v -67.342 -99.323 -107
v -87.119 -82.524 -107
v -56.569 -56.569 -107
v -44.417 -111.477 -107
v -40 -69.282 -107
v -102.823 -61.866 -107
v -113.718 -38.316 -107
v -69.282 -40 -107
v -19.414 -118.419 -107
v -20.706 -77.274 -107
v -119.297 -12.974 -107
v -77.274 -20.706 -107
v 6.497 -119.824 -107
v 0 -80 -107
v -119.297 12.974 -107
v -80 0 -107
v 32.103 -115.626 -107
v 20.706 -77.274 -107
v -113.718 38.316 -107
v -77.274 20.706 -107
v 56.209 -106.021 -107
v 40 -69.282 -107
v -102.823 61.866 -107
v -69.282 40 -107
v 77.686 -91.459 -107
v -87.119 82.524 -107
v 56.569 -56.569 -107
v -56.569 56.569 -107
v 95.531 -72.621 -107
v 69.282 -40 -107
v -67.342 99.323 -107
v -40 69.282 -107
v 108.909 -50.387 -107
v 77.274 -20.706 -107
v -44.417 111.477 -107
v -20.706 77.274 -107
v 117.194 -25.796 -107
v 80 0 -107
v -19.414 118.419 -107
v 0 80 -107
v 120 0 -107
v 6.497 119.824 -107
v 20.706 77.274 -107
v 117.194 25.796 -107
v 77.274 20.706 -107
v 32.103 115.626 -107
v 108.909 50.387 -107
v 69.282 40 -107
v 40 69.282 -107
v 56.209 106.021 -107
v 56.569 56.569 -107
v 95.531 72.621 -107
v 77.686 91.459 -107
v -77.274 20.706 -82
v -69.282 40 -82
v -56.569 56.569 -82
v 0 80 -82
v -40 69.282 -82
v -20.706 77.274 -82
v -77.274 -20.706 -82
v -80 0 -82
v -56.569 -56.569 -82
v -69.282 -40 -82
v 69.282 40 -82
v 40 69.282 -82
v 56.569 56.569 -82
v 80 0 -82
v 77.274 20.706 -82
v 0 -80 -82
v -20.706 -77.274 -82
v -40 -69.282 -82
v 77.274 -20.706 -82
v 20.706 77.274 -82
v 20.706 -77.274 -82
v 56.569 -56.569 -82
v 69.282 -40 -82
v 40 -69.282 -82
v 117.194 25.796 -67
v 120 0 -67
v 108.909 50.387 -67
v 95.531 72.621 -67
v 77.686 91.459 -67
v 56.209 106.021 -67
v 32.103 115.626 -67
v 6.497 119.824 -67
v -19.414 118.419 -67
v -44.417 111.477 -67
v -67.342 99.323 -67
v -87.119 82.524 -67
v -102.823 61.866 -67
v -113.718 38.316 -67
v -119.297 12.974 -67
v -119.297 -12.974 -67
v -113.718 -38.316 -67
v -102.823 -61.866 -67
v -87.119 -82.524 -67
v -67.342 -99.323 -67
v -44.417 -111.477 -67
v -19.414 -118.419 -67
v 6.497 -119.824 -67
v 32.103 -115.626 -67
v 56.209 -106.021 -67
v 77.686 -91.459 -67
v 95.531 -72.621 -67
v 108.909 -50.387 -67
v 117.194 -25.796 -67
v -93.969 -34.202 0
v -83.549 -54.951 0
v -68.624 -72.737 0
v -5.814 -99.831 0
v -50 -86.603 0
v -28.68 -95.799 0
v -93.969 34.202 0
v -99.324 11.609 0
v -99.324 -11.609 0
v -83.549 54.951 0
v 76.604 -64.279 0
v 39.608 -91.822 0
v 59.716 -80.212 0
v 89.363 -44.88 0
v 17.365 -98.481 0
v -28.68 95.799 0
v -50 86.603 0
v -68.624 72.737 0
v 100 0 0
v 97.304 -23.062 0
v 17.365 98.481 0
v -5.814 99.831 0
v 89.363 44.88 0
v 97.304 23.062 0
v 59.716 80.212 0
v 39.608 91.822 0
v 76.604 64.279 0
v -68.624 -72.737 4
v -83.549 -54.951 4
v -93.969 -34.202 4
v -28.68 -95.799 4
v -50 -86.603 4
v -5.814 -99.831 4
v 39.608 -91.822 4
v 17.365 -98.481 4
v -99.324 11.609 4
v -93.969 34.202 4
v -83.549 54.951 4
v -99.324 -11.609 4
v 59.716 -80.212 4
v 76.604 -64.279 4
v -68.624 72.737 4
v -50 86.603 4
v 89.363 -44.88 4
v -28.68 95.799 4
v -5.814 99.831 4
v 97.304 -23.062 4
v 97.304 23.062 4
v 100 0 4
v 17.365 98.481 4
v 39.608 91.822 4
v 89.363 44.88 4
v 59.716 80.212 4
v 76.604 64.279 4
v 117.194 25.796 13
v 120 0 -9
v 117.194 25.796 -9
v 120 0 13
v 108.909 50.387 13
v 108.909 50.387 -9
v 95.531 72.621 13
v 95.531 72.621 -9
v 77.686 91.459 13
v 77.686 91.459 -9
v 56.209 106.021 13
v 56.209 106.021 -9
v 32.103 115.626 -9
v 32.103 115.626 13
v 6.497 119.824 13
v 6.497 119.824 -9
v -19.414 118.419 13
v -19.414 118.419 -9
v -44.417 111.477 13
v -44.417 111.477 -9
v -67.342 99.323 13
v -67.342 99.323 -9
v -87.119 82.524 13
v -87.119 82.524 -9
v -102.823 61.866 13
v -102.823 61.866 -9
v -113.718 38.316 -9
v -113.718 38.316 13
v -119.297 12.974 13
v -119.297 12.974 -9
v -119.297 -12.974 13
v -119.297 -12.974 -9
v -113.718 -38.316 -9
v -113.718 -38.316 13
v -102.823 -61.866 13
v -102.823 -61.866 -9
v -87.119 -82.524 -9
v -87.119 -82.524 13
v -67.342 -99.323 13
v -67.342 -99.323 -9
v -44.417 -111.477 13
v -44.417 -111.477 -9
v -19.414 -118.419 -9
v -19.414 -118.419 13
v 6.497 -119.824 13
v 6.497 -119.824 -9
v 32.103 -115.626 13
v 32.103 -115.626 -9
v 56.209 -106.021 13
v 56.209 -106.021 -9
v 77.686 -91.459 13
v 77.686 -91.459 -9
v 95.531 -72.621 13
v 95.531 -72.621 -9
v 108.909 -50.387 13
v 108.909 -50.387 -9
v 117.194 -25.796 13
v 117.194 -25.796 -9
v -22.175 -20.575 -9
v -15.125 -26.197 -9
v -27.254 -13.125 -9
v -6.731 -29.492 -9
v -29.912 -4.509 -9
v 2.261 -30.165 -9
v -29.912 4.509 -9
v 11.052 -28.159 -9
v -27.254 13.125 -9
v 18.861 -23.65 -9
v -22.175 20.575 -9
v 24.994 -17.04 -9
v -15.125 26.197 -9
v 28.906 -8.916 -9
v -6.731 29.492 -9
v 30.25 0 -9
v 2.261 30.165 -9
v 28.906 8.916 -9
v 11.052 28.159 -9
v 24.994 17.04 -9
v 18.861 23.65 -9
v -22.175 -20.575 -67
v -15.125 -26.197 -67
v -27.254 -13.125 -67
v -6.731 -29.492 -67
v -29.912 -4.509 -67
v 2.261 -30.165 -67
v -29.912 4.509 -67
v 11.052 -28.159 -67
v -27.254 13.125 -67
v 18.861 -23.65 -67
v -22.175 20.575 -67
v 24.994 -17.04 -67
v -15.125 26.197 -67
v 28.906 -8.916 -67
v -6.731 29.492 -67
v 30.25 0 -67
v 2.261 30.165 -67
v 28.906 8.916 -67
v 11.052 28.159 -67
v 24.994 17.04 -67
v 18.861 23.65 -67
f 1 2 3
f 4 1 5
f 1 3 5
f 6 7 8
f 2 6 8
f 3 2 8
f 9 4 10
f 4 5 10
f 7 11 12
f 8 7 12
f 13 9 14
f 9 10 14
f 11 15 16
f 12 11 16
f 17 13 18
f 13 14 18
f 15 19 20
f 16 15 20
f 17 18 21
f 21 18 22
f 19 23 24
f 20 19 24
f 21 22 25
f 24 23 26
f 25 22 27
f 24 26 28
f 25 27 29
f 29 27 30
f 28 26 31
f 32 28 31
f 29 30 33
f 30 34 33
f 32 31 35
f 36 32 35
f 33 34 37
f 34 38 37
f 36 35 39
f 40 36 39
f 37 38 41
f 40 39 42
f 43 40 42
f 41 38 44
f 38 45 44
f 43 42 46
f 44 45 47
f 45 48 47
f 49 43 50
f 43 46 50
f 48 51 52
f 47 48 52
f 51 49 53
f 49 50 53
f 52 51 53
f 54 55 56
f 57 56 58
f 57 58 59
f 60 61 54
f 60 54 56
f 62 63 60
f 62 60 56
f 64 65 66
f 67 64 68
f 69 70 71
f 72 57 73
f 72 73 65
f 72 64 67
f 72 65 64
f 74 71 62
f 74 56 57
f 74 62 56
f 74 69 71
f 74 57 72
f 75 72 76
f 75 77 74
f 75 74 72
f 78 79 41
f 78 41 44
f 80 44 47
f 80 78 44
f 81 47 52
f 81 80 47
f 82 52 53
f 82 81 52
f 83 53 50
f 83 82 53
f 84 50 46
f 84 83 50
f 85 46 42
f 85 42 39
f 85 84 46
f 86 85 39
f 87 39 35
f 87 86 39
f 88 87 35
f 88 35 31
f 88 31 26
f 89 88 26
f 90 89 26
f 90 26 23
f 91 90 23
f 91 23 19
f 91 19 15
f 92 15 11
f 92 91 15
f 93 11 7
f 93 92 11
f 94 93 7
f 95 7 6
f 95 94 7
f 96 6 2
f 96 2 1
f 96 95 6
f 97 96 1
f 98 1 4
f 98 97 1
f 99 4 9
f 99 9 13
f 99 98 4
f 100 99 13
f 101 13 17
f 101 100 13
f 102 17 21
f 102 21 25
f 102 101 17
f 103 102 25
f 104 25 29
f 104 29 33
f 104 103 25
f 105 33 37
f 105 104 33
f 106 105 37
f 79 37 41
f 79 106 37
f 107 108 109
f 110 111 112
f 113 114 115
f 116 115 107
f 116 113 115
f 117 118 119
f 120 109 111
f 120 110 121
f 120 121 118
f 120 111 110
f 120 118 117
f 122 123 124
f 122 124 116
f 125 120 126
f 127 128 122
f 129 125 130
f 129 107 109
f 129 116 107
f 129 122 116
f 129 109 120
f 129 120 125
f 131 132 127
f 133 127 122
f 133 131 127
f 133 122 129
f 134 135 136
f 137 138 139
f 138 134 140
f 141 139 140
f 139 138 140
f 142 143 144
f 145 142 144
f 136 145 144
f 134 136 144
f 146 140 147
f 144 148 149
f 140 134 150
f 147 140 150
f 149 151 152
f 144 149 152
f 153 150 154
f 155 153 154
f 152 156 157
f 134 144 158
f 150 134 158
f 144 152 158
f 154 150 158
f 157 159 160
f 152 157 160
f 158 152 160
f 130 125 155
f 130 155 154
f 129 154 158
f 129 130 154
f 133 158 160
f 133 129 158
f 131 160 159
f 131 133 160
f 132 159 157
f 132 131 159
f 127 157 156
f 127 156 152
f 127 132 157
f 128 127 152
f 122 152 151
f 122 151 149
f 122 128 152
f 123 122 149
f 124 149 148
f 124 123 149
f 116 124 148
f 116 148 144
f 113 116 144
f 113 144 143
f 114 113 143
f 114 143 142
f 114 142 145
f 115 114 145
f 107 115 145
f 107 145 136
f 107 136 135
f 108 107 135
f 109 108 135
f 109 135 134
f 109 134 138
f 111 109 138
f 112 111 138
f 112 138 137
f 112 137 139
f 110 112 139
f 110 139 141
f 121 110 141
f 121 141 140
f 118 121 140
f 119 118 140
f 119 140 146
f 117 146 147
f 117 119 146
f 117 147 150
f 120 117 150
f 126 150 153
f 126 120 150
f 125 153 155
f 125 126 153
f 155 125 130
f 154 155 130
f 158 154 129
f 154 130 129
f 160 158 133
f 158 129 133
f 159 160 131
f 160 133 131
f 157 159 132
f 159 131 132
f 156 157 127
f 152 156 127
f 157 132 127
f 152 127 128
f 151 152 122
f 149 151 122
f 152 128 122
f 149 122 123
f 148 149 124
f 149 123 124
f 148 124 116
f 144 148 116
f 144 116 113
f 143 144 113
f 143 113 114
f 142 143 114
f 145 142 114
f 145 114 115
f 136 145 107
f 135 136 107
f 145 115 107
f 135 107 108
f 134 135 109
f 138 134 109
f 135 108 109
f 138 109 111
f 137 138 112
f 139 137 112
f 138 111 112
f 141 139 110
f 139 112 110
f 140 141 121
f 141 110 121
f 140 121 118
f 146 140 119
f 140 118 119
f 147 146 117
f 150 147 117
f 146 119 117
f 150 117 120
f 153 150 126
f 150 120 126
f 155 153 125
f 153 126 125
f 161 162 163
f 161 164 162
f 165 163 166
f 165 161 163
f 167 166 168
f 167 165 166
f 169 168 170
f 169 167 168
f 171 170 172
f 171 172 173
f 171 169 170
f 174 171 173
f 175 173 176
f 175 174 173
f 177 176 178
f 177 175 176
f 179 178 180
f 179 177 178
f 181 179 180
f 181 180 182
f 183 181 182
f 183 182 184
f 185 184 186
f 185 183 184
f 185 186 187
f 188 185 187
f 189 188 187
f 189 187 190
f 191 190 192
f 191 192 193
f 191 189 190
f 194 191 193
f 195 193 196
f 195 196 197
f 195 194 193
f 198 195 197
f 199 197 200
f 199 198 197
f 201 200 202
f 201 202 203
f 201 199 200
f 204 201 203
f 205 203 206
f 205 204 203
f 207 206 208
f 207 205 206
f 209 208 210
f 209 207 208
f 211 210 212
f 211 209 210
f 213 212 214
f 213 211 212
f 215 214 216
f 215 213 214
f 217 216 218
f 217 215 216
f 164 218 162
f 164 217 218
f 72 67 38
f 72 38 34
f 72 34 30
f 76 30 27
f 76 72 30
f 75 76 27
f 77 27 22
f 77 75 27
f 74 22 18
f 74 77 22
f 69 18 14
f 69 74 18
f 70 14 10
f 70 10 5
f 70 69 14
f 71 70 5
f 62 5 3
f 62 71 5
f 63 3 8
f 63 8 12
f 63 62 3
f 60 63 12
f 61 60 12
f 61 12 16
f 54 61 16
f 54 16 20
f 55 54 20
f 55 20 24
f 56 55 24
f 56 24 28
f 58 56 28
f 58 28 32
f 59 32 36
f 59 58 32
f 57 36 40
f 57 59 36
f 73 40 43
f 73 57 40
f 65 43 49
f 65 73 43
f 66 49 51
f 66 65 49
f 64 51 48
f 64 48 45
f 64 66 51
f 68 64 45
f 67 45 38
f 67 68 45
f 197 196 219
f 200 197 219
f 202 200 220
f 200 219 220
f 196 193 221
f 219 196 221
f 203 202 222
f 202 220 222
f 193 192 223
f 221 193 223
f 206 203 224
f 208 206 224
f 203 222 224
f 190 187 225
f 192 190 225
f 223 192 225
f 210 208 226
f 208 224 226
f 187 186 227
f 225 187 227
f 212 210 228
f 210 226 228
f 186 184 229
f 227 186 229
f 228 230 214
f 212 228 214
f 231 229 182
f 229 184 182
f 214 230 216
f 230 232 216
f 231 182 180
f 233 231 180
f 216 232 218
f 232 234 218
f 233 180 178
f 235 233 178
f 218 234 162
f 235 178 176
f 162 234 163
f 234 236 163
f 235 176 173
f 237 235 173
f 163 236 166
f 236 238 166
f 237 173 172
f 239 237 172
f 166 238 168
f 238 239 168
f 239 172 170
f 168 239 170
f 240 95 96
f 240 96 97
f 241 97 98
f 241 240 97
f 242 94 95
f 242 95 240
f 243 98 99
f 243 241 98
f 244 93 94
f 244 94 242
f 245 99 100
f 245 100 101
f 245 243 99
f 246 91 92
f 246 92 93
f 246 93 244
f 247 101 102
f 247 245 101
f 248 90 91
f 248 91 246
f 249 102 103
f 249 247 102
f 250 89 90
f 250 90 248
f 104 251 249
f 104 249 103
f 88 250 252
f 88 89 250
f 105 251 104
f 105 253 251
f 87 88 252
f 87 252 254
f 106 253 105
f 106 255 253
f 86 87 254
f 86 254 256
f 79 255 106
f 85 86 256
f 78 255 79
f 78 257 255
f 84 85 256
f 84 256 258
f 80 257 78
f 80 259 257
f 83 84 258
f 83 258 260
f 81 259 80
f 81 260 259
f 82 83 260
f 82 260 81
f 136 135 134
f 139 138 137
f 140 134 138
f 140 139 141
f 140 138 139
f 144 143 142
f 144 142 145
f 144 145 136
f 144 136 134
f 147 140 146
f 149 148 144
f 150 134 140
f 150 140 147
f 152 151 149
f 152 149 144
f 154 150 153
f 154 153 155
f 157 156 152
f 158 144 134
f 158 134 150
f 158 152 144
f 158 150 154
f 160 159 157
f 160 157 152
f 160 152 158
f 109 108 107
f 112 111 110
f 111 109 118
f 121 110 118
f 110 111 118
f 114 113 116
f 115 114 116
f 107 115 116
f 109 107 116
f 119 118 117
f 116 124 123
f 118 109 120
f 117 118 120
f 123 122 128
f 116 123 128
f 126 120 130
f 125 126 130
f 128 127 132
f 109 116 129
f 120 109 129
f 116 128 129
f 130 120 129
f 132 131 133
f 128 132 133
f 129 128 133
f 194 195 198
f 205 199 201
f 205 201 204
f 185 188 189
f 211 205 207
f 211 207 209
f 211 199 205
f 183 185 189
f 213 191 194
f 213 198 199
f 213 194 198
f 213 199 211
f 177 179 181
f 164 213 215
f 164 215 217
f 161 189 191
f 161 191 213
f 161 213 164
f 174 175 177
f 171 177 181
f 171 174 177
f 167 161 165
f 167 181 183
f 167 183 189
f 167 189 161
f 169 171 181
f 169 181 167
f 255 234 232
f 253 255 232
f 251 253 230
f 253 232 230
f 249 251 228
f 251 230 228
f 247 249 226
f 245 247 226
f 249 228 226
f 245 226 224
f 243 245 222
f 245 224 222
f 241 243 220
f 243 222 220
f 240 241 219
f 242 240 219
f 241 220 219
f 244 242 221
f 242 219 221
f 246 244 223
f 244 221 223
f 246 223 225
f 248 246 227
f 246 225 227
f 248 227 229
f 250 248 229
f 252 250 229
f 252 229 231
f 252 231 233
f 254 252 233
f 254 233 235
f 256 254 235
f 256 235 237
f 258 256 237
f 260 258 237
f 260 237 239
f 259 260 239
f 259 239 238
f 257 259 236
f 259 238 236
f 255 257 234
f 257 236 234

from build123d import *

# Parameters (mm, degrees)
F0_R      = 120
F0_R_2    = 100
F1_DEPTH  = 9
F2_DEPTH  = 4
F3_DEPTH  = 13
F4_DEPTH  = 9
F5_R      = 30.25
F6_DEPTH  = 58
F7_START  = -80
F4_FACE_R = 120
F7_DEPTH  = 40
F8_START  = 73
F5_R_2    = 80
F8_DEPTH  = 25


with BuildPart() as f1:
    # F0 (on Top) → F1 (new body)
    with BuildSketch(Plane.XY):
        Circle(F0_R)
        Circle(F0_R_2, mode=Mode.SUBTRACT)
        Circle(F0_R_2)
    extrude(amount=-F1_DEPTH)

    # F0 (on Top) → F3 (join)
    with BuildSketch(Plane.XY):
        Circle(F0_R)
        Circle(F0_R_2, mode=Mode.SUBTRACT)
    extrude(amount=F3_DEPTH)



with BuildPart() as f2:
    # F0 (on Top) → F2 (new body)
    with BuildSketch(Plane.XY):
        Circle(F0_R_2)
    extrude(amount=F2_DEPTH)


with BuildPart() as f1_1:
    add(f1.part)
    # F4 (add): a face of the model
    f4_faces = [f2.part.faces().sort_by_distance(p)[0] for p in [
        (0, 0, 4),
    ]]
    extrude(f4_faces, amount=F4_DEPTH)

    # F5 (on face) → F6 (join)
    with BuildSketch(Plane(origin=(0, 0, -9), x_dir=(1, 0, 0), z_dir=(0, 0, -1))):
        Circle(F5_R)
    extrude(amount=F6_DEPTH)

    # F4_face (on face) → F7 (join)
    with BuildSketch(Plane.XY.offset(13).offset(F7_START)):
        Circle(F4_FACE_R)
    extrude(amount=-F7_DEPTH)

    # F5 (on face) → F8 (cut)
    with BuildSketch(Plane(origin=(0, 0, -9), x_dir=(1, 0, 0), z_dir=(0, 0, -1)).offset(F8_START)):
        Circle(F5_R_2)
        Circle(F5_R, mode=Mode.SUBTRACT)
        Circle(F5_R)
    extrude(amount=F8_DEPTH, mode=Mode.SUBTRACT)


solid = Compound([f2.part, f1_1.part])
